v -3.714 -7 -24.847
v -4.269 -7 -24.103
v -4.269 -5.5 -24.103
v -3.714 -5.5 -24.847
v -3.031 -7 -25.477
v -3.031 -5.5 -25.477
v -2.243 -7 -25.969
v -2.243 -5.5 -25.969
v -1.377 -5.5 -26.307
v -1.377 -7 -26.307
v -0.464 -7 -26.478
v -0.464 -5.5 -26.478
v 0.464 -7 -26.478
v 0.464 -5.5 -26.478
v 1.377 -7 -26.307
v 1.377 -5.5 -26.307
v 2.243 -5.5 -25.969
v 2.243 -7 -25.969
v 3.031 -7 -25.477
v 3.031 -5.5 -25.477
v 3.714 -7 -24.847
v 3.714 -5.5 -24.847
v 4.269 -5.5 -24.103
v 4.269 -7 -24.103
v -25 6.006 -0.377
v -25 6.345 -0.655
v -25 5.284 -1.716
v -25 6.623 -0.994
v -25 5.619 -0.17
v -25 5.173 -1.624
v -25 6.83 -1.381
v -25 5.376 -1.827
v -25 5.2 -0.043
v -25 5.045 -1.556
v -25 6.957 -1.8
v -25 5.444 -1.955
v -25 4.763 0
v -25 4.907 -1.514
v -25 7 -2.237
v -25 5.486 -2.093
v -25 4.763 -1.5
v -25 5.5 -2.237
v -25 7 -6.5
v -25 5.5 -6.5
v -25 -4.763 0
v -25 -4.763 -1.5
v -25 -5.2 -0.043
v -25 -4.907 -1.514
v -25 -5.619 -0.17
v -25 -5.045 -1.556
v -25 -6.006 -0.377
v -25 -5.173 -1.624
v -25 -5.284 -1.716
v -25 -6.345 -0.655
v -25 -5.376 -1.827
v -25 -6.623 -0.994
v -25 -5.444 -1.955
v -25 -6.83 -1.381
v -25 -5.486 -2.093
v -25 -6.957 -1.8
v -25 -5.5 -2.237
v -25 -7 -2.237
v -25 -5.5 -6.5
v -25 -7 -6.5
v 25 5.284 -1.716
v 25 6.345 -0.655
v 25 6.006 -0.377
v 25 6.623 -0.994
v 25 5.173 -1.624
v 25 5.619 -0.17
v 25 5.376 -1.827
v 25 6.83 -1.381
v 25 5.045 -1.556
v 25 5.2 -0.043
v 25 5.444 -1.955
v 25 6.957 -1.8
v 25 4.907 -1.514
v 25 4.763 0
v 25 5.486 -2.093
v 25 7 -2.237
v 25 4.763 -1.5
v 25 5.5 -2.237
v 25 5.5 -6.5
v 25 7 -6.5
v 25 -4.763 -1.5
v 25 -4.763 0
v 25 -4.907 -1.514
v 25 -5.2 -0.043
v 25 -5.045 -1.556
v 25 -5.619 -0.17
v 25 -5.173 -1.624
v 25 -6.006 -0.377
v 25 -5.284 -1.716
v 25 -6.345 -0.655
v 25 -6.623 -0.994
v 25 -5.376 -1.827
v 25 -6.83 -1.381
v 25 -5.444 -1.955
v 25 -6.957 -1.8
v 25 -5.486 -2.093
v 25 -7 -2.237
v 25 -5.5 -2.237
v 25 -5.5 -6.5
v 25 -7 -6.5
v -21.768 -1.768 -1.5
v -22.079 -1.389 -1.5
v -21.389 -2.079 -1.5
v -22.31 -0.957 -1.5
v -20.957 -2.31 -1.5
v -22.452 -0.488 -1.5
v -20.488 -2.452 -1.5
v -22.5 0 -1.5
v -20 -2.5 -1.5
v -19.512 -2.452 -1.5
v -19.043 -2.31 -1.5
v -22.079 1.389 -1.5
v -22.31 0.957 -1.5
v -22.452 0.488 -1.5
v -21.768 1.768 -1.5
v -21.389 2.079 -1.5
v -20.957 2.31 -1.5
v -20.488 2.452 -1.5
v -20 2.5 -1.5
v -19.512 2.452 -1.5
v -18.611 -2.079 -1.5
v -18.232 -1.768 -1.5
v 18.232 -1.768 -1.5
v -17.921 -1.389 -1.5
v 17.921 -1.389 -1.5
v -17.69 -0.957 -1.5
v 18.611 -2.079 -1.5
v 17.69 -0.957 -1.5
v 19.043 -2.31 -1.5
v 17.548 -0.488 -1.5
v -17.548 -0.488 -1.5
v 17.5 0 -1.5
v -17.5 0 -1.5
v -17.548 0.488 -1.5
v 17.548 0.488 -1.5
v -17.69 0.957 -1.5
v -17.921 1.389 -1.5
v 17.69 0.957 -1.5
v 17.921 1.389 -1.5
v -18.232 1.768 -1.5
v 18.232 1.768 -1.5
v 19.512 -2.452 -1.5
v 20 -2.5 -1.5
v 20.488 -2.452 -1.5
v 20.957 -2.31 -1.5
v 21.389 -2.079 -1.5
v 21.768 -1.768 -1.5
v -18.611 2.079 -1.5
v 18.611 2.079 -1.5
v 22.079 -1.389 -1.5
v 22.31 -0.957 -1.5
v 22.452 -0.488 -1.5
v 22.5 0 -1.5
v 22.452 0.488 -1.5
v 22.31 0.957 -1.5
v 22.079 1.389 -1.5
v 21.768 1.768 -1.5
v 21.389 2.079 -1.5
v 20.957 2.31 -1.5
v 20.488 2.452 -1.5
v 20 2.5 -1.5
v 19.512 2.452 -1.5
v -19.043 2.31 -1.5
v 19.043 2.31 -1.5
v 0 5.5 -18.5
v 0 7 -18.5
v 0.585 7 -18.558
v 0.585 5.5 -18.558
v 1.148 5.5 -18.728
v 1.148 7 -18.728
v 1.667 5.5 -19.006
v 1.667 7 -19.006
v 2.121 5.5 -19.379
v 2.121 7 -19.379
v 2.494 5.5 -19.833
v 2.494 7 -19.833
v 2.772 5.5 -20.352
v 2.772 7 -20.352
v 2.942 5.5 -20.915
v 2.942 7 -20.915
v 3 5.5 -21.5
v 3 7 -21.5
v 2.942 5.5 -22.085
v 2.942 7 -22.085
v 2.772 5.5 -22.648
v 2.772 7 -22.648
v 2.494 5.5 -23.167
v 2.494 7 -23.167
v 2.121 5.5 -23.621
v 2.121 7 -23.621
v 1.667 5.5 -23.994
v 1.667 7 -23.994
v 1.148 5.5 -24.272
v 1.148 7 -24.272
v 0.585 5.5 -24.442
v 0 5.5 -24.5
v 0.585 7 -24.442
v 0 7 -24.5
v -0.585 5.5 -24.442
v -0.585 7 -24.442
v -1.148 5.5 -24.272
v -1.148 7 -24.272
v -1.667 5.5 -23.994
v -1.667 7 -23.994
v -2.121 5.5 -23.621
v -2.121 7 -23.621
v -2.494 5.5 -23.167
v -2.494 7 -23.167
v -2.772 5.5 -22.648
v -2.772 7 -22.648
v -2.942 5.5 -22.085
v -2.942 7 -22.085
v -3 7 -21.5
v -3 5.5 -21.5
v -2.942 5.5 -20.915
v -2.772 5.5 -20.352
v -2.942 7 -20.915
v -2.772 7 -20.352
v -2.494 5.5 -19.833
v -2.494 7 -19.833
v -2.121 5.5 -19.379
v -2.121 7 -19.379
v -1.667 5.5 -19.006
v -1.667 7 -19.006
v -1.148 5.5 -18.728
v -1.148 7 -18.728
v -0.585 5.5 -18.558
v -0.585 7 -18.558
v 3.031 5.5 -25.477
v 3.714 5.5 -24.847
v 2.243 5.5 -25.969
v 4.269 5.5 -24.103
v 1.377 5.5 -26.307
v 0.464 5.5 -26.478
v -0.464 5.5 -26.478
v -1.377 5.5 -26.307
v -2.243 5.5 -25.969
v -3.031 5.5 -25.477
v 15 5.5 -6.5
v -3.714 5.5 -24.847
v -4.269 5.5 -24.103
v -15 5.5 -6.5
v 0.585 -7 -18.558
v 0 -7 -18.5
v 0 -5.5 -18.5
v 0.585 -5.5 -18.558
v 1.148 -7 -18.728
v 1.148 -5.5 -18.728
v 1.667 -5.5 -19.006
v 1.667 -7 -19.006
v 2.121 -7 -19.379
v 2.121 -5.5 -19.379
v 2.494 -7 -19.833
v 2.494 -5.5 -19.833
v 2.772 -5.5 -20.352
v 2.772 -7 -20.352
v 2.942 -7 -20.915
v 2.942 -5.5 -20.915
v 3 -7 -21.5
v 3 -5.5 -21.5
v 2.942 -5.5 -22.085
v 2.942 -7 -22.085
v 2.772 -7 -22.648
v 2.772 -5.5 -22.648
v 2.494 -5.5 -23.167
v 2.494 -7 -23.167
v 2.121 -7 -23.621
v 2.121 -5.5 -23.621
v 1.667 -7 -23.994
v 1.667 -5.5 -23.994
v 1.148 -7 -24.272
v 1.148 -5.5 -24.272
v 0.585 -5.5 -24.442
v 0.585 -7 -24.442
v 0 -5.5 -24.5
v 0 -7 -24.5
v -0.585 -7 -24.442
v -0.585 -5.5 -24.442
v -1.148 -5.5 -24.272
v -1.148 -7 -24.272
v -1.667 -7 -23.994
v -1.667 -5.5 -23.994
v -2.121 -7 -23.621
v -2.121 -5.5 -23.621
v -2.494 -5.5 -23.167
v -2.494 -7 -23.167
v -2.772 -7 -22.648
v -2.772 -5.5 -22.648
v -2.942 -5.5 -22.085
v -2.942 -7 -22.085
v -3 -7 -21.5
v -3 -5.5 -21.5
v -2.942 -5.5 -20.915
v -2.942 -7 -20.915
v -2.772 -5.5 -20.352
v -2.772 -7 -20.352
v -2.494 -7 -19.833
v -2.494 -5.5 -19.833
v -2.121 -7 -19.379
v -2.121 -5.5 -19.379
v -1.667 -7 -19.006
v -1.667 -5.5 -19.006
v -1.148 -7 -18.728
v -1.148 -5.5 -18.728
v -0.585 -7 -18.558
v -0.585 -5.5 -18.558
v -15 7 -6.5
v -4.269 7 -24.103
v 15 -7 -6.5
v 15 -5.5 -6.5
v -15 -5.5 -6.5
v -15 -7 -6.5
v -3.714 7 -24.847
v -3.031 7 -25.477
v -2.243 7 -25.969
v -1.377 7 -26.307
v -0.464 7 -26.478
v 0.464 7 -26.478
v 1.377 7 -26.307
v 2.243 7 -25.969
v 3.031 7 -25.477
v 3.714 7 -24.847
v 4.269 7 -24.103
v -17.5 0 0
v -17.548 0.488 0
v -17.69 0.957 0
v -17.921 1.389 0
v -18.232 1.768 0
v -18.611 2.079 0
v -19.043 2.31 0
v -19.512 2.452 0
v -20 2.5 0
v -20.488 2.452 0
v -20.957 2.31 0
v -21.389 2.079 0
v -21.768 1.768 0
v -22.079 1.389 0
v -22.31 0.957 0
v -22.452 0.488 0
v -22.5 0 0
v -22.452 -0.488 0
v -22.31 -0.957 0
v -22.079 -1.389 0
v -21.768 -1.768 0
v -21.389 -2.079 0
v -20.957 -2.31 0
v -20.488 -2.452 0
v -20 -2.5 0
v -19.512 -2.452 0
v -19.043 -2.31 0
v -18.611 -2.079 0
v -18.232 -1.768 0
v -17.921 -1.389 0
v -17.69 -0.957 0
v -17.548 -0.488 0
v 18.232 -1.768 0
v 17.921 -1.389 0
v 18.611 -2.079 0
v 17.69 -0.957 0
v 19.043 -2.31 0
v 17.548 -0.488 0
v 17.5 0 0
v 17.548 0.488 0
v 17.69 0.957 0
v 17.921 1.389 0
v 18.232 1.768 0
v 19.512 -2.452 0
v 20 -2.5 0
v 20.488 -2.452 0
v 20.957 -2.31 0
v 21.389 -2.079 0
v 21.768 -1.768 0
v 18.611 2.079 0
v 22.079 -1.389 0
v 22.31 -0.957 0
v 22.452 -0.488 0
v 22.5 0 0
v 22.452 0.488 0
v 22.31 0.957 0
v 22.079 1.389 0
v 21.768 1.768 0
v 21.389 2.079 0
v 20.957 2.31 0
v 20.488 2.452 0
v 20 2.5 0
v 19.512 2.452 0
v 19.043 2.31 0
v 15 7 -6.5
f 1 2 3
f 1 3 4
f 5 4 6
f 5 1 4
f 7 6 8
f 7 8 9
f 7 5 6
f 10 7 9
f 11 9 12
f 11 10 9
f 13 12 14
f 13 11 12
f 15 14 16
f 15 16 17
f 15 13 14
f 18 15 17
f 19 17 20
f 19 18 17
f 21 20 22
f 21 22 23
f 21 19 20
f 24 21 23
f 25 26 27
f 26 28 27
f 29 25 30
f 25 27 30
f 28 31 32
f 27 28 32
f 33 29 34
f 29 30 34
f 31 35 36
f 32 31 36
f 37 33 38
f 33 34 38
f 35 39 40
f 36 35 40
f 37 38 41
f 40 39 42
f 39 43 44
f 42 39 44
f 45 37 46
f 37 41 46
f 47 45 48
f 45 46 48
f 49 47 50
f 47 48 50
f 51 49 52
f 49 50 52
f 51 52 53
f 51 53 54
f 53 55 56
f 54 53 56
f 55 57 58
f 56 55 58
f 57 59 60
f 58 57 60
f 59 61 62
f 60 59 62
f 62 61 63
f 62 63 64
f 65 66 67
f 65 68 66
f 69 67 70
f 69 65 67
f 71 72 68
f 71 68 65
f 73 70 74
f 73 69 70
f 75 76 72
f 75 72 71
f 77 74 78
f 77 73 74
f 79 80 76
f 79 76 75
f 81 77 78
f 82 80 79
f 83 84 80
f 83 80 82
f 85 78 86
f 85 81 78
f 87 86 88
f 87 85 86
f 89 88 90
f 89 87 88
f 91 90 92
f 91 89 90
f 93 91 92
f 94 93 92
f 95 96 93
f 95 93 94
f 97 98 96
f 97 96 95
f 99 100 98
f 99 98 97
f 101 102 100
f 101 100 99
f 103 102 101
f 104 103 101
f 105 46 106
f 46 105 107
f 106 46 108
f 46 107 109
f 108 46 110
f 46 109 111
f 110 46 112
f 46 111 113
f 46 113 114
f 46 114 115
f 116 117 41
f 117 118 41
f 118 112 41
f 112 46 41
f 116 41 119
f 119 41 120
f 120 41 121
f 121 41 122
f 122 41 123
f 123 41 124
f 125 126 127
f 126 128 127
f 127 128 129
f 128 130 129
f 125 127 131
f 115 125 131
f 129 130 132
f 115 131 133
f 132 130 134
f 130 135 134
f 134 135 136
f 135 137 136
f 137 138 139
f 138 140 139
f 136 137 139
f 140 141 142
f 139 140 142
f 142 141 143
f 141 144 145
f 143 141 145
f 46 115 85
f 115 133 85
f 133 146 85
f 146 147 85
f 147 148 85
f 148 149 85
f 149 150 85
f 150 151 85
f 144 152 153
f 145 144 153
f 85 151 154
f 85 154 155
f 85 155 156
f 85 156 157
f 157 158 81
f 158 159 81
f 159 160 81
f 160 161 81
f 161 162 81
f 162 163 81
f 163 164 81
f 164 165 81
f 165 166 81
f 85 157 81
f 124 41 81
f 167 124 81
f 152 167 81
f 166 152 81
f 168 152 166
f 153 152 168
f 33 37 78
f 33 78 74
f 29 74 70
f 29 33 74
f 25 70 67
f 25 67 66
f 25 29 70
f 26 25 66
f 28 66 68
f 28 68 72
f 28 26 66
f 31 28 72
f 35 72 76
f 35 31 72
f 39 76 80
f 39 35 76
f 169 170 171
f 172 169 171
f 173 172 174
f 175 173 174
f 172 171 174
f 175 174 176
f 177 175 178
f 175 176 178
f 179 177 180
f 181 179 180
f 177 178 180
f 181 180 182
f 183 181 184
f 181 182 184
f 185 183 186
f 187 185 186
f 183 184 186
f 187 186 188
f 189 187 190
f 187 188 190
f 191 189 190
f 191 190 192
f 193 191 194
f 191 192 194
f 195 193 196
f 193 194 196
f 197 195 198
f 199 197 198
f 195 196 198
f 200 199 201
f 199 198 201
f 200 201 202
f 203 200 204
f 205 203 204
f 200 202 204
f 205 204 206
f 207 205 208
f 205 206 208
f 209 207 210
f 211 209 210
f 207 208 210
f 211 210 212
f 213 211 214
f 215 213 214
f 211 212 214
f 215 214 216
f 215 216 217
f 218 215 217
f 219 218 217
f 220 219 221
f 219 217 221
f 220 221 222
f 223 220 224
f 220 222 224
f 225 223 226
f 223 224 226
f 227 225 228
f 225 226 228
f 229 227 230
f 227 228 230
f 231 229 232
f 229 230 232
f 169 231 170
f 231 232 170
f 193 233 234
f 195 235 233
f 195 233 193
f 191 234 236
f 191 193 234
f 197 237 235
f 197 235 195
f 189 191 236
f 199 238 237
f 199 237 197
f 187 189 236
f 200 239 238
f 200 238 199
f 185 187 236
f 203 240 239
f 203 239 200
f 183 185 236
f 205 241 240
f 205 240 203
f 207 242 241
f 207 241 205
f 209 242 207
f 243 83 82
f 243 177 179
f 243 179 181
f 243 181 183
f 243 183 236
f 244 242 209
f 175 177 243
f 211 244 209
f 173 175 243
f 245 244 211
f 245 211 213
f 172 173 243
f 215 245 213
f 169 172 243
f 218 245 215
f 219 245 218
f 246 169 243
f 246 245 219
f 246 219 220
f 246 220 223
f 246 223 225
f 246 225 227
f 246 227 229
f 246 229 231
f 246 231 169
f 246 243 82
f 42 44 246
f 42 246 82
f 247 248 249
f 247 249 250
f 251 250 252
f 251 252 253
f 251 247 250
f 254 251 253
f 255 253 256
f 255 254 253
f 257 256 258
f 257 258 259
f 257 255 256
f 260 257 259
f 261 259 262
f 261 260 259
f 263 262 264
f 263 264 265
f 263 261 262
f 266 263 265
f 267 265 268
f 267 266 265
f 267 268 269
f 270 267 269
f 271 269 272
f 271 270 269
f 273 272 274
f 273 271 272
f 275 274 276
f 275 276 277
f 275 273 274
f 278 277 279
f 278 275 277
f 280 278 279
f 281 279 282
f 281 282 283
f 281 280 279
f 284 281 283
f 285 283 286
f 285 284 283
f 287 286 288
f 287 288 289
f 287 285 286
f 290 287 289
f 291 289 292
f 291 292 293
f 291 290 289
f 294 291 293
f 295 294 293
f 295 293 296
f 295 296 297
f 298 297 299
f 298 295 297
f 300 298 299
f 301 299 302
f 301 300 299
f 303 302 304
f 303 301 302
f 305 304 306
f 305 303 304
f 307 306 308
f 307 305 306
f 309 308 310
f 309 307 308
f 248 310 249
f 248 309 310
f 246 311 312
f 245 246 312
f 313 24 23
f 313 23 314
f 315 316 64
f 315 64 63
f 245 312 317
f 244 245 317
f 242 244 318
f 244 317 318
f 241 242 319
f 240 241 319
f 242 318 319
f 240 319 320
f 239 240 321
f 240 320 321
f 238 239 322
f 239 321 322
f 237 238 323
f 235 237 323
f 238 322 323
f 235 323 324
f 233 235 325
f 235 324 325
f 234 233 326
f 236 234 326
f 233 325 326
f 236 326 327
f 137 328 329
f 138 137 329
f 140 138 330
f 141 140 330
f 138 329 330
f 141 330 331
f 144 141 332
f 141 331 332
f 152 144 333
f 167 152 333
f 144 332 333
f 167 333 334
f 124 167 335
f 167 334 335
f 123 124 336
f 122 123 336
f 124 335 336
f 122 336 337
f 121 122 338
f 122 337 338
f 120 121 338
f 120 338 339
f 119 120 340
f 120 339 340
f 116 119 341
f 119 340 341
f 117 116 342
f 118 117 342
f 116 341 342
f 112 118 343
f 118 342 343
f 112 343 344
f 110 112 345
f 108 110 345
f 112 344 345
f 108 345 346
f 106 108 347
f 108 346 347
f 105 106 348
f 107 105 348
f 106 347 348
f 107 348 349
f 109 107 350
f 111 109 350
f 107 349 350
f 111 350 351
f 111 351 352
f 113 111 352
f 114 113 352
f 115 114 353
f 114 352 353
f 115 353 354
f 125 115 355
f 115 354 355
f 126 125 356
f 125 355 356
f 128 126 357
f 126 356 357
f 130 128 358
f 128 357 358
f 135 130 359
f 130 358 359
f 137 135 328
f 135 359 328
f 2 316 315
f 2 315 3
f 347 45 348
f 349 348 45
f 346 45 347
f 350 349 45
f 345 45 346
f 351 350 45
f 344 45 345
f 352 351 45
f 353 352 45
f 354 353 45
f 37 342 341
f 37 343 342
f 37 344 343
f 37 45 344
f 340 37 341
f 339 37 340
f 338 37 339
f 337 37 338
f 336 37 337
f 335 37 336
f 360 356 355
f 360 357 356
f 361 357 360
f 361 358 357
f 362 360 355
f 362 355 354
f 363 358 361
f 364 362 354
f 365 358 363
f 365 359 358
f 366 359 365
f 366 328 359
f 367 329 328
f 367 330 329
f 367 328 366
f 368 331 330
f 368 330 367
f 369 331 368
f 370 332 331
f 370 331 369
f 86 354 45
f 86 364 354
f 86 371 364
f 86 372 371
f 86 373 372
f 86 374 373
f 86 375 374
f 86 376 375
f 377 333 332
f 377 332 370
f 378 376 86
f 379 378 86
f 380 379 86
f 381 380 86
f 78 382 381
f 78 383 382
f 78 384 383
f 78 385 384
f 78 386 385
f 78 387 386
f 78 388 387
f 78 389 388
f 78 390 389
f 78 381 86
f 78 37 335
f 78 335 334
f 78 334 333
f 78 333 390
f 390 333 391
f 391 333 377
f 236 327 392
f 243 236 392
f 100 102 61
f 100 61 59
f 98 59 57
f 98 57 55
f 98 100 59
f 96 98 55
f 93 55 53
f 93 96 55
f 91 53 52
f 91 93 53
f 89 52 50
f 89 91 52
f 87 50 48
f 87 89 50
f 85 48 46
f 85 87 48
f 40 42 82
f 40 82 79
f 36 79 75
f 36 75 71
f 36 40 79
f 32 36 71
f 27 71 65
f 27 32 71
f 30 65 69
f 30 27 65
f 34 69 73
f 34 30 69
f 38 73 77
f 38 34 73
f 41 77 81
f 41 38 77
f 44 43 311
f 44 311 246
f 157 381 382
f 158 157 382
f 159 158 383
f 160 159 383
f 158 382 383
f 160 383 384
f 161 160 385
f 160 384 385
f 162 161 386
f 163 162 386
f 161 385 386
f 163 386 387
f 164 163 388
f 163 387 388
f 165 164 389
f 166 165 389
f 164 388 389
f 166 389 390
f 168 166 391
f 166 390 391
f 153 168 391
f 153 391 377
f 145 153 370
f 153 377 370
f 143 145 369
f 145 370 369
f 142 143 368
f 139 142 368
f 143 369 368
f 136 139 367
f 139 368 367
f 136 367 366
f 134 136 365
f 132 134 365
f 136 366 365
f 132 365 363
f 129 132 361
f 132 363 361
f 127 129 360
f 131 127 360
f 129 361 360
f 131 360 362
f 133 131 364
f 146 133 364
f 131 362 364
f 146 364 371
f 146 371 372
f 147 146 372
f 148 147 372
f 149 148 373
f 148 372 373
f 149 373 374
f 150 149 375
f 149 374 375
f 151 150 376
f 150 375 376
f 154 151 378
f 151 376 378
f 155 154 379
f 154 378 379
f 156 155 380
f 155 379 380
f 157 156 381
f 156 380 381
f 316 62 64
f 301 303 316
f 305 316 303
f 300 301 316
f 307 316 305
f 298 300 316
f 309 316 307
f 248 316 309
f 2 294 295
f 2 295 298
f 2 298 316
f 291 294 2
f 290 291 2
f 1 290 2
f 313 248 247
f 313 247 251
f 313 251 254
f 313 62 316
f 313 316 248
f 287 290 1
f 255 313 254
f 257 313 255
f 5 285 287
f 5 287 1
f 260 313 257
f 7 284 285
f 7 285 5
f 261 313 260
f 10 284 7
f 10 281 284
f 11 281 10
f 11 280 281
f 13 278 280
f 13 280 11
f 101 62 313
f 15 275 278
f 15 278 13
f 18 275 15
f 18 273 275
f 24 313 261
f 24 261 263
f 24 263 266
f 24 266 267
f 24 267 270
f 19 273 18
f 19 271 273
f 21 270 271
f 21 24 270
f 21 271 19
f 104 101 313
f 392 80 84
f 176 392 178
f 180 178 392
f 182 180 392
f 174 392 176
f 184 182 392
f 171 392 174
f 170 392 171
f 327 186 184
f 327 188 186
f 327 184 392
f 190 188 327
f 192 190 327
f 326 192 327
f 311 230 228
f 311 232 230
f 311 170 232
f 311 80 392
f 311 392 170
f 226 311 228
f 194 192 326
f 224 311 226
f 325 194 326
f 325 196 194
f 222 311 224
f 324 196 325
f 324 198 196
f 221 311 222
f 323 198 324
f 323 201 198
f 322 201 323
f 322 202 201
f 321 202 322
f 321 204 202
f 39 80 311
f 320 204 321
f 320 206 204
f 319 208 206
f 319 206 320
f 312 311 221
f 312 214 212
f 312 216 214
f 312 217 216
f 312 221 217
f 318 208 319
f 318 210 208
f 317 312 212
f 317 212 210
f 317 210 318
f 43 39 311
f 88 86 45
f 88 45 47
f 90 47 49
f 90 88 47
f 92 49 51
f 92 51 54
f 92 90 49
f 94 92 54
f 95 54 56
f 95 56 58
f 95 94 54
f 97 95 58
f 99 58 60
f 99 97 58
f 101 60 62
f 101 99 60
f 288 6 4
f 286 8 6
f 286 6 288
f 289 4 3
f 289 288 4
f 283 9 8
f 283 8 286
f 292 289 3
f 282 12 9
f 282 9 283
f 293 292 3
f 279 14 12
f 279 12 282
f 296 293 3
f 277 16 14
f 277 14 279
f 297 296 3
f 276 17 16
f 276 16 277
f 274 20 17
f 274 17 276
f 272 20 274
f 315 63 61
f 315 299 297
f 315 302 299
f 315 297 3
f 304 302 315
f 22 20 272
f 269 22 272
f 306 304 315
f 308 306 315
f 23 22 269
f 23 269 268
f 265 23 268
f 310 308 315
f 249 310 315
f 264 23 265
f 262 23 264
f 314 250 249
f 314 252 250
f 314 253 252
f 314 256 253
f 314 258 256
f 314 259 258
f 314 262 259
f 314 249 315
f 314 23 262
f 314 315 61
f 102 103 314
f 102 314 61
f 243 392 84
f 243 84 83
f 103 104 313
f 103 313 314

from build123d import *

# Parameters (mm, degrees)
SKETCH1_W                      = 50
SKETCH1_H                      = 11
SKETCH1_R                      = 2.5
BASE_FLANGE1_DEPTH             = 1.5
EDGE_FLANGE1_STRIP_W           = 7.4732
EDGE_FLANGE1_STRIP_H           = 1.5
EDGE_FLANGE1_STRIP_CUT_DEPTH   = 50
EDGE_FLANGE1_STRIP_2_W         = 7.4732
EDGE_FLANGE1_STRIP_2_H         = 1.5
EDGE_FLANGE1_STRIP_CUT_2_DEPTH = 50
EDGE_FLANGE1_DEPTH             = 50
EDGE_FLANGE1_BEND_DEPTH        = 50
SKETCH10_R                     = 3
TAB2_DEPTH                     = 1.5


# Sheet-metal steps are written as plain solids
with BuildPart() as part:
    # Sketch1 → Base-Flange1 (new body)
    with BuildSketch(Plane.XY):
        Rectangle(SKETCH1_W, SKETCH1_H)
        with Locations((-20, 0)):
            Circle(SKETCH1_R, mode=Mode.SUBTRACT)
        with Locations((20, 0)):
            Circle(SKETCH1_R, mode=Mode.SUBTRACT)
    extrude(amount=-BASE_FLANGE1_DEPTH)

    # Edge-Flange1 strip (across the edge) → Edge-Flange1 strip cut (cut)
    with BuildSketch(Plane(origin=(-25, 5.5, -1.5), x_dir=(0, -1, 0), z_dir=(1, 0, 0))):
        with Locations((-3, -0.75)):
            Rectangle(EDGE_FLANGE1_STRIP_W, EDGE_FLANGE1_STRIP_H)
    extrude(amount=EDGE_FLANGE1_STRIP_CUT_DEPTH, mode=Mode.SUBTRACT)

    # Edge-Flange1 strip 2 (across the edge) → Edge-Flange1 strip cut 2 (cut)
    with BuildSketch(Plane(origin=(25, -5.5, -1.5), x_dir=(0, 1, 0), z_dir=(-1, 0, 0))):
        with Locations((-3, -0.75)):
            Rectangle(EDGE_FLANGE1_STRIP_2_W, EDGE_FLANGE1_STRIP_2_H)
    extrude(amount=EDGE_FLANGE1_STRIP_CUT_2_DEPTH, mode=Mode.SUBTRACT)

    # Edge-Flange1 section (across the edge) → Edge-Flange1 (add)
    with BuildSketch(Plane(origin=(-25, 5.5, -1.5), x_dir=(0, -1, 0), z_dir=(1, 0, 0))):
        with BuildLine():
            Line((-1.5, 0.7366), (-1.5, 5))
            Line((-1.5, 5), (0, 5))
            Line((0, 5), (0, 0.7366))
            ThreePointArc((0, 0.7366), (0.215745145, 0.215745145), (0.7366, 0))
            Line((0.7366, 0), (0.7366, -1.5))
            ThreePointArc((0.7366, -1.5), (-0.844915027, -0.844915027), (-1.5, 0.7366))
        make_face()
    extrude(amount=EDGE_FLANGE1_DEPTH)

    # Edge-Flange1 section 2 (across the edge) → Edge-Flange1 bend (add)
    with BuildSketch(Plane(origin=(25, -5.5, -1.5), x_dir=(0, 1, 0), z_dir=(-1, 0, 0))):
        with BuildLine():
            Line((-1.5, 0.7366), (-1.5, 5))
            Line((-1.5, 5), (0, 5))
            Line((0, 5), (0, 0.7366))
            ThreePointArc((0, 0.7366), (0.215745145, 0.215745145), (0.7366, 0))
            Line((0.7366, 0), (0.7366, -1.5))
            ThreePointArc((0.7366, -1.5), (-0.844915027, -0.844915027), (-1.5, 0.7366))
        make_face()
    extrude(amount=EDGE_FLANGE1_BEND_DEPTH)

    # Sketch10 → Tab2 (add)
    with BuildSketch(Plane(origin=(0, 7, 0), x_dir=(1, 0, 0), z_dir=(0, 1, 0))):
        with BuildLine():
            Line((-15, 6.5), (-4.269254688, 24.102588021))
            ThreePointArc((-4.269254688, 24.102588021), (0, 26.5), (4.269254688, 24.102588021))
            Line((4.269254688, 24.102588021), (15, 6.5))
            Line((15, 6.5), (-15, 6.5))
        make_face()
        with Locations(Location((0, 21.5, 0), (0, 0, 270))):
            Circle(SKETCH10_R, mode=Mode.SUBTRACT)
    tab2 = extrude(amount=-TAB2_DEPTH)

    # Mirror1: Tab2 across plane
    add(tab2.mirror(Plane.ZX))


solid = part.part
